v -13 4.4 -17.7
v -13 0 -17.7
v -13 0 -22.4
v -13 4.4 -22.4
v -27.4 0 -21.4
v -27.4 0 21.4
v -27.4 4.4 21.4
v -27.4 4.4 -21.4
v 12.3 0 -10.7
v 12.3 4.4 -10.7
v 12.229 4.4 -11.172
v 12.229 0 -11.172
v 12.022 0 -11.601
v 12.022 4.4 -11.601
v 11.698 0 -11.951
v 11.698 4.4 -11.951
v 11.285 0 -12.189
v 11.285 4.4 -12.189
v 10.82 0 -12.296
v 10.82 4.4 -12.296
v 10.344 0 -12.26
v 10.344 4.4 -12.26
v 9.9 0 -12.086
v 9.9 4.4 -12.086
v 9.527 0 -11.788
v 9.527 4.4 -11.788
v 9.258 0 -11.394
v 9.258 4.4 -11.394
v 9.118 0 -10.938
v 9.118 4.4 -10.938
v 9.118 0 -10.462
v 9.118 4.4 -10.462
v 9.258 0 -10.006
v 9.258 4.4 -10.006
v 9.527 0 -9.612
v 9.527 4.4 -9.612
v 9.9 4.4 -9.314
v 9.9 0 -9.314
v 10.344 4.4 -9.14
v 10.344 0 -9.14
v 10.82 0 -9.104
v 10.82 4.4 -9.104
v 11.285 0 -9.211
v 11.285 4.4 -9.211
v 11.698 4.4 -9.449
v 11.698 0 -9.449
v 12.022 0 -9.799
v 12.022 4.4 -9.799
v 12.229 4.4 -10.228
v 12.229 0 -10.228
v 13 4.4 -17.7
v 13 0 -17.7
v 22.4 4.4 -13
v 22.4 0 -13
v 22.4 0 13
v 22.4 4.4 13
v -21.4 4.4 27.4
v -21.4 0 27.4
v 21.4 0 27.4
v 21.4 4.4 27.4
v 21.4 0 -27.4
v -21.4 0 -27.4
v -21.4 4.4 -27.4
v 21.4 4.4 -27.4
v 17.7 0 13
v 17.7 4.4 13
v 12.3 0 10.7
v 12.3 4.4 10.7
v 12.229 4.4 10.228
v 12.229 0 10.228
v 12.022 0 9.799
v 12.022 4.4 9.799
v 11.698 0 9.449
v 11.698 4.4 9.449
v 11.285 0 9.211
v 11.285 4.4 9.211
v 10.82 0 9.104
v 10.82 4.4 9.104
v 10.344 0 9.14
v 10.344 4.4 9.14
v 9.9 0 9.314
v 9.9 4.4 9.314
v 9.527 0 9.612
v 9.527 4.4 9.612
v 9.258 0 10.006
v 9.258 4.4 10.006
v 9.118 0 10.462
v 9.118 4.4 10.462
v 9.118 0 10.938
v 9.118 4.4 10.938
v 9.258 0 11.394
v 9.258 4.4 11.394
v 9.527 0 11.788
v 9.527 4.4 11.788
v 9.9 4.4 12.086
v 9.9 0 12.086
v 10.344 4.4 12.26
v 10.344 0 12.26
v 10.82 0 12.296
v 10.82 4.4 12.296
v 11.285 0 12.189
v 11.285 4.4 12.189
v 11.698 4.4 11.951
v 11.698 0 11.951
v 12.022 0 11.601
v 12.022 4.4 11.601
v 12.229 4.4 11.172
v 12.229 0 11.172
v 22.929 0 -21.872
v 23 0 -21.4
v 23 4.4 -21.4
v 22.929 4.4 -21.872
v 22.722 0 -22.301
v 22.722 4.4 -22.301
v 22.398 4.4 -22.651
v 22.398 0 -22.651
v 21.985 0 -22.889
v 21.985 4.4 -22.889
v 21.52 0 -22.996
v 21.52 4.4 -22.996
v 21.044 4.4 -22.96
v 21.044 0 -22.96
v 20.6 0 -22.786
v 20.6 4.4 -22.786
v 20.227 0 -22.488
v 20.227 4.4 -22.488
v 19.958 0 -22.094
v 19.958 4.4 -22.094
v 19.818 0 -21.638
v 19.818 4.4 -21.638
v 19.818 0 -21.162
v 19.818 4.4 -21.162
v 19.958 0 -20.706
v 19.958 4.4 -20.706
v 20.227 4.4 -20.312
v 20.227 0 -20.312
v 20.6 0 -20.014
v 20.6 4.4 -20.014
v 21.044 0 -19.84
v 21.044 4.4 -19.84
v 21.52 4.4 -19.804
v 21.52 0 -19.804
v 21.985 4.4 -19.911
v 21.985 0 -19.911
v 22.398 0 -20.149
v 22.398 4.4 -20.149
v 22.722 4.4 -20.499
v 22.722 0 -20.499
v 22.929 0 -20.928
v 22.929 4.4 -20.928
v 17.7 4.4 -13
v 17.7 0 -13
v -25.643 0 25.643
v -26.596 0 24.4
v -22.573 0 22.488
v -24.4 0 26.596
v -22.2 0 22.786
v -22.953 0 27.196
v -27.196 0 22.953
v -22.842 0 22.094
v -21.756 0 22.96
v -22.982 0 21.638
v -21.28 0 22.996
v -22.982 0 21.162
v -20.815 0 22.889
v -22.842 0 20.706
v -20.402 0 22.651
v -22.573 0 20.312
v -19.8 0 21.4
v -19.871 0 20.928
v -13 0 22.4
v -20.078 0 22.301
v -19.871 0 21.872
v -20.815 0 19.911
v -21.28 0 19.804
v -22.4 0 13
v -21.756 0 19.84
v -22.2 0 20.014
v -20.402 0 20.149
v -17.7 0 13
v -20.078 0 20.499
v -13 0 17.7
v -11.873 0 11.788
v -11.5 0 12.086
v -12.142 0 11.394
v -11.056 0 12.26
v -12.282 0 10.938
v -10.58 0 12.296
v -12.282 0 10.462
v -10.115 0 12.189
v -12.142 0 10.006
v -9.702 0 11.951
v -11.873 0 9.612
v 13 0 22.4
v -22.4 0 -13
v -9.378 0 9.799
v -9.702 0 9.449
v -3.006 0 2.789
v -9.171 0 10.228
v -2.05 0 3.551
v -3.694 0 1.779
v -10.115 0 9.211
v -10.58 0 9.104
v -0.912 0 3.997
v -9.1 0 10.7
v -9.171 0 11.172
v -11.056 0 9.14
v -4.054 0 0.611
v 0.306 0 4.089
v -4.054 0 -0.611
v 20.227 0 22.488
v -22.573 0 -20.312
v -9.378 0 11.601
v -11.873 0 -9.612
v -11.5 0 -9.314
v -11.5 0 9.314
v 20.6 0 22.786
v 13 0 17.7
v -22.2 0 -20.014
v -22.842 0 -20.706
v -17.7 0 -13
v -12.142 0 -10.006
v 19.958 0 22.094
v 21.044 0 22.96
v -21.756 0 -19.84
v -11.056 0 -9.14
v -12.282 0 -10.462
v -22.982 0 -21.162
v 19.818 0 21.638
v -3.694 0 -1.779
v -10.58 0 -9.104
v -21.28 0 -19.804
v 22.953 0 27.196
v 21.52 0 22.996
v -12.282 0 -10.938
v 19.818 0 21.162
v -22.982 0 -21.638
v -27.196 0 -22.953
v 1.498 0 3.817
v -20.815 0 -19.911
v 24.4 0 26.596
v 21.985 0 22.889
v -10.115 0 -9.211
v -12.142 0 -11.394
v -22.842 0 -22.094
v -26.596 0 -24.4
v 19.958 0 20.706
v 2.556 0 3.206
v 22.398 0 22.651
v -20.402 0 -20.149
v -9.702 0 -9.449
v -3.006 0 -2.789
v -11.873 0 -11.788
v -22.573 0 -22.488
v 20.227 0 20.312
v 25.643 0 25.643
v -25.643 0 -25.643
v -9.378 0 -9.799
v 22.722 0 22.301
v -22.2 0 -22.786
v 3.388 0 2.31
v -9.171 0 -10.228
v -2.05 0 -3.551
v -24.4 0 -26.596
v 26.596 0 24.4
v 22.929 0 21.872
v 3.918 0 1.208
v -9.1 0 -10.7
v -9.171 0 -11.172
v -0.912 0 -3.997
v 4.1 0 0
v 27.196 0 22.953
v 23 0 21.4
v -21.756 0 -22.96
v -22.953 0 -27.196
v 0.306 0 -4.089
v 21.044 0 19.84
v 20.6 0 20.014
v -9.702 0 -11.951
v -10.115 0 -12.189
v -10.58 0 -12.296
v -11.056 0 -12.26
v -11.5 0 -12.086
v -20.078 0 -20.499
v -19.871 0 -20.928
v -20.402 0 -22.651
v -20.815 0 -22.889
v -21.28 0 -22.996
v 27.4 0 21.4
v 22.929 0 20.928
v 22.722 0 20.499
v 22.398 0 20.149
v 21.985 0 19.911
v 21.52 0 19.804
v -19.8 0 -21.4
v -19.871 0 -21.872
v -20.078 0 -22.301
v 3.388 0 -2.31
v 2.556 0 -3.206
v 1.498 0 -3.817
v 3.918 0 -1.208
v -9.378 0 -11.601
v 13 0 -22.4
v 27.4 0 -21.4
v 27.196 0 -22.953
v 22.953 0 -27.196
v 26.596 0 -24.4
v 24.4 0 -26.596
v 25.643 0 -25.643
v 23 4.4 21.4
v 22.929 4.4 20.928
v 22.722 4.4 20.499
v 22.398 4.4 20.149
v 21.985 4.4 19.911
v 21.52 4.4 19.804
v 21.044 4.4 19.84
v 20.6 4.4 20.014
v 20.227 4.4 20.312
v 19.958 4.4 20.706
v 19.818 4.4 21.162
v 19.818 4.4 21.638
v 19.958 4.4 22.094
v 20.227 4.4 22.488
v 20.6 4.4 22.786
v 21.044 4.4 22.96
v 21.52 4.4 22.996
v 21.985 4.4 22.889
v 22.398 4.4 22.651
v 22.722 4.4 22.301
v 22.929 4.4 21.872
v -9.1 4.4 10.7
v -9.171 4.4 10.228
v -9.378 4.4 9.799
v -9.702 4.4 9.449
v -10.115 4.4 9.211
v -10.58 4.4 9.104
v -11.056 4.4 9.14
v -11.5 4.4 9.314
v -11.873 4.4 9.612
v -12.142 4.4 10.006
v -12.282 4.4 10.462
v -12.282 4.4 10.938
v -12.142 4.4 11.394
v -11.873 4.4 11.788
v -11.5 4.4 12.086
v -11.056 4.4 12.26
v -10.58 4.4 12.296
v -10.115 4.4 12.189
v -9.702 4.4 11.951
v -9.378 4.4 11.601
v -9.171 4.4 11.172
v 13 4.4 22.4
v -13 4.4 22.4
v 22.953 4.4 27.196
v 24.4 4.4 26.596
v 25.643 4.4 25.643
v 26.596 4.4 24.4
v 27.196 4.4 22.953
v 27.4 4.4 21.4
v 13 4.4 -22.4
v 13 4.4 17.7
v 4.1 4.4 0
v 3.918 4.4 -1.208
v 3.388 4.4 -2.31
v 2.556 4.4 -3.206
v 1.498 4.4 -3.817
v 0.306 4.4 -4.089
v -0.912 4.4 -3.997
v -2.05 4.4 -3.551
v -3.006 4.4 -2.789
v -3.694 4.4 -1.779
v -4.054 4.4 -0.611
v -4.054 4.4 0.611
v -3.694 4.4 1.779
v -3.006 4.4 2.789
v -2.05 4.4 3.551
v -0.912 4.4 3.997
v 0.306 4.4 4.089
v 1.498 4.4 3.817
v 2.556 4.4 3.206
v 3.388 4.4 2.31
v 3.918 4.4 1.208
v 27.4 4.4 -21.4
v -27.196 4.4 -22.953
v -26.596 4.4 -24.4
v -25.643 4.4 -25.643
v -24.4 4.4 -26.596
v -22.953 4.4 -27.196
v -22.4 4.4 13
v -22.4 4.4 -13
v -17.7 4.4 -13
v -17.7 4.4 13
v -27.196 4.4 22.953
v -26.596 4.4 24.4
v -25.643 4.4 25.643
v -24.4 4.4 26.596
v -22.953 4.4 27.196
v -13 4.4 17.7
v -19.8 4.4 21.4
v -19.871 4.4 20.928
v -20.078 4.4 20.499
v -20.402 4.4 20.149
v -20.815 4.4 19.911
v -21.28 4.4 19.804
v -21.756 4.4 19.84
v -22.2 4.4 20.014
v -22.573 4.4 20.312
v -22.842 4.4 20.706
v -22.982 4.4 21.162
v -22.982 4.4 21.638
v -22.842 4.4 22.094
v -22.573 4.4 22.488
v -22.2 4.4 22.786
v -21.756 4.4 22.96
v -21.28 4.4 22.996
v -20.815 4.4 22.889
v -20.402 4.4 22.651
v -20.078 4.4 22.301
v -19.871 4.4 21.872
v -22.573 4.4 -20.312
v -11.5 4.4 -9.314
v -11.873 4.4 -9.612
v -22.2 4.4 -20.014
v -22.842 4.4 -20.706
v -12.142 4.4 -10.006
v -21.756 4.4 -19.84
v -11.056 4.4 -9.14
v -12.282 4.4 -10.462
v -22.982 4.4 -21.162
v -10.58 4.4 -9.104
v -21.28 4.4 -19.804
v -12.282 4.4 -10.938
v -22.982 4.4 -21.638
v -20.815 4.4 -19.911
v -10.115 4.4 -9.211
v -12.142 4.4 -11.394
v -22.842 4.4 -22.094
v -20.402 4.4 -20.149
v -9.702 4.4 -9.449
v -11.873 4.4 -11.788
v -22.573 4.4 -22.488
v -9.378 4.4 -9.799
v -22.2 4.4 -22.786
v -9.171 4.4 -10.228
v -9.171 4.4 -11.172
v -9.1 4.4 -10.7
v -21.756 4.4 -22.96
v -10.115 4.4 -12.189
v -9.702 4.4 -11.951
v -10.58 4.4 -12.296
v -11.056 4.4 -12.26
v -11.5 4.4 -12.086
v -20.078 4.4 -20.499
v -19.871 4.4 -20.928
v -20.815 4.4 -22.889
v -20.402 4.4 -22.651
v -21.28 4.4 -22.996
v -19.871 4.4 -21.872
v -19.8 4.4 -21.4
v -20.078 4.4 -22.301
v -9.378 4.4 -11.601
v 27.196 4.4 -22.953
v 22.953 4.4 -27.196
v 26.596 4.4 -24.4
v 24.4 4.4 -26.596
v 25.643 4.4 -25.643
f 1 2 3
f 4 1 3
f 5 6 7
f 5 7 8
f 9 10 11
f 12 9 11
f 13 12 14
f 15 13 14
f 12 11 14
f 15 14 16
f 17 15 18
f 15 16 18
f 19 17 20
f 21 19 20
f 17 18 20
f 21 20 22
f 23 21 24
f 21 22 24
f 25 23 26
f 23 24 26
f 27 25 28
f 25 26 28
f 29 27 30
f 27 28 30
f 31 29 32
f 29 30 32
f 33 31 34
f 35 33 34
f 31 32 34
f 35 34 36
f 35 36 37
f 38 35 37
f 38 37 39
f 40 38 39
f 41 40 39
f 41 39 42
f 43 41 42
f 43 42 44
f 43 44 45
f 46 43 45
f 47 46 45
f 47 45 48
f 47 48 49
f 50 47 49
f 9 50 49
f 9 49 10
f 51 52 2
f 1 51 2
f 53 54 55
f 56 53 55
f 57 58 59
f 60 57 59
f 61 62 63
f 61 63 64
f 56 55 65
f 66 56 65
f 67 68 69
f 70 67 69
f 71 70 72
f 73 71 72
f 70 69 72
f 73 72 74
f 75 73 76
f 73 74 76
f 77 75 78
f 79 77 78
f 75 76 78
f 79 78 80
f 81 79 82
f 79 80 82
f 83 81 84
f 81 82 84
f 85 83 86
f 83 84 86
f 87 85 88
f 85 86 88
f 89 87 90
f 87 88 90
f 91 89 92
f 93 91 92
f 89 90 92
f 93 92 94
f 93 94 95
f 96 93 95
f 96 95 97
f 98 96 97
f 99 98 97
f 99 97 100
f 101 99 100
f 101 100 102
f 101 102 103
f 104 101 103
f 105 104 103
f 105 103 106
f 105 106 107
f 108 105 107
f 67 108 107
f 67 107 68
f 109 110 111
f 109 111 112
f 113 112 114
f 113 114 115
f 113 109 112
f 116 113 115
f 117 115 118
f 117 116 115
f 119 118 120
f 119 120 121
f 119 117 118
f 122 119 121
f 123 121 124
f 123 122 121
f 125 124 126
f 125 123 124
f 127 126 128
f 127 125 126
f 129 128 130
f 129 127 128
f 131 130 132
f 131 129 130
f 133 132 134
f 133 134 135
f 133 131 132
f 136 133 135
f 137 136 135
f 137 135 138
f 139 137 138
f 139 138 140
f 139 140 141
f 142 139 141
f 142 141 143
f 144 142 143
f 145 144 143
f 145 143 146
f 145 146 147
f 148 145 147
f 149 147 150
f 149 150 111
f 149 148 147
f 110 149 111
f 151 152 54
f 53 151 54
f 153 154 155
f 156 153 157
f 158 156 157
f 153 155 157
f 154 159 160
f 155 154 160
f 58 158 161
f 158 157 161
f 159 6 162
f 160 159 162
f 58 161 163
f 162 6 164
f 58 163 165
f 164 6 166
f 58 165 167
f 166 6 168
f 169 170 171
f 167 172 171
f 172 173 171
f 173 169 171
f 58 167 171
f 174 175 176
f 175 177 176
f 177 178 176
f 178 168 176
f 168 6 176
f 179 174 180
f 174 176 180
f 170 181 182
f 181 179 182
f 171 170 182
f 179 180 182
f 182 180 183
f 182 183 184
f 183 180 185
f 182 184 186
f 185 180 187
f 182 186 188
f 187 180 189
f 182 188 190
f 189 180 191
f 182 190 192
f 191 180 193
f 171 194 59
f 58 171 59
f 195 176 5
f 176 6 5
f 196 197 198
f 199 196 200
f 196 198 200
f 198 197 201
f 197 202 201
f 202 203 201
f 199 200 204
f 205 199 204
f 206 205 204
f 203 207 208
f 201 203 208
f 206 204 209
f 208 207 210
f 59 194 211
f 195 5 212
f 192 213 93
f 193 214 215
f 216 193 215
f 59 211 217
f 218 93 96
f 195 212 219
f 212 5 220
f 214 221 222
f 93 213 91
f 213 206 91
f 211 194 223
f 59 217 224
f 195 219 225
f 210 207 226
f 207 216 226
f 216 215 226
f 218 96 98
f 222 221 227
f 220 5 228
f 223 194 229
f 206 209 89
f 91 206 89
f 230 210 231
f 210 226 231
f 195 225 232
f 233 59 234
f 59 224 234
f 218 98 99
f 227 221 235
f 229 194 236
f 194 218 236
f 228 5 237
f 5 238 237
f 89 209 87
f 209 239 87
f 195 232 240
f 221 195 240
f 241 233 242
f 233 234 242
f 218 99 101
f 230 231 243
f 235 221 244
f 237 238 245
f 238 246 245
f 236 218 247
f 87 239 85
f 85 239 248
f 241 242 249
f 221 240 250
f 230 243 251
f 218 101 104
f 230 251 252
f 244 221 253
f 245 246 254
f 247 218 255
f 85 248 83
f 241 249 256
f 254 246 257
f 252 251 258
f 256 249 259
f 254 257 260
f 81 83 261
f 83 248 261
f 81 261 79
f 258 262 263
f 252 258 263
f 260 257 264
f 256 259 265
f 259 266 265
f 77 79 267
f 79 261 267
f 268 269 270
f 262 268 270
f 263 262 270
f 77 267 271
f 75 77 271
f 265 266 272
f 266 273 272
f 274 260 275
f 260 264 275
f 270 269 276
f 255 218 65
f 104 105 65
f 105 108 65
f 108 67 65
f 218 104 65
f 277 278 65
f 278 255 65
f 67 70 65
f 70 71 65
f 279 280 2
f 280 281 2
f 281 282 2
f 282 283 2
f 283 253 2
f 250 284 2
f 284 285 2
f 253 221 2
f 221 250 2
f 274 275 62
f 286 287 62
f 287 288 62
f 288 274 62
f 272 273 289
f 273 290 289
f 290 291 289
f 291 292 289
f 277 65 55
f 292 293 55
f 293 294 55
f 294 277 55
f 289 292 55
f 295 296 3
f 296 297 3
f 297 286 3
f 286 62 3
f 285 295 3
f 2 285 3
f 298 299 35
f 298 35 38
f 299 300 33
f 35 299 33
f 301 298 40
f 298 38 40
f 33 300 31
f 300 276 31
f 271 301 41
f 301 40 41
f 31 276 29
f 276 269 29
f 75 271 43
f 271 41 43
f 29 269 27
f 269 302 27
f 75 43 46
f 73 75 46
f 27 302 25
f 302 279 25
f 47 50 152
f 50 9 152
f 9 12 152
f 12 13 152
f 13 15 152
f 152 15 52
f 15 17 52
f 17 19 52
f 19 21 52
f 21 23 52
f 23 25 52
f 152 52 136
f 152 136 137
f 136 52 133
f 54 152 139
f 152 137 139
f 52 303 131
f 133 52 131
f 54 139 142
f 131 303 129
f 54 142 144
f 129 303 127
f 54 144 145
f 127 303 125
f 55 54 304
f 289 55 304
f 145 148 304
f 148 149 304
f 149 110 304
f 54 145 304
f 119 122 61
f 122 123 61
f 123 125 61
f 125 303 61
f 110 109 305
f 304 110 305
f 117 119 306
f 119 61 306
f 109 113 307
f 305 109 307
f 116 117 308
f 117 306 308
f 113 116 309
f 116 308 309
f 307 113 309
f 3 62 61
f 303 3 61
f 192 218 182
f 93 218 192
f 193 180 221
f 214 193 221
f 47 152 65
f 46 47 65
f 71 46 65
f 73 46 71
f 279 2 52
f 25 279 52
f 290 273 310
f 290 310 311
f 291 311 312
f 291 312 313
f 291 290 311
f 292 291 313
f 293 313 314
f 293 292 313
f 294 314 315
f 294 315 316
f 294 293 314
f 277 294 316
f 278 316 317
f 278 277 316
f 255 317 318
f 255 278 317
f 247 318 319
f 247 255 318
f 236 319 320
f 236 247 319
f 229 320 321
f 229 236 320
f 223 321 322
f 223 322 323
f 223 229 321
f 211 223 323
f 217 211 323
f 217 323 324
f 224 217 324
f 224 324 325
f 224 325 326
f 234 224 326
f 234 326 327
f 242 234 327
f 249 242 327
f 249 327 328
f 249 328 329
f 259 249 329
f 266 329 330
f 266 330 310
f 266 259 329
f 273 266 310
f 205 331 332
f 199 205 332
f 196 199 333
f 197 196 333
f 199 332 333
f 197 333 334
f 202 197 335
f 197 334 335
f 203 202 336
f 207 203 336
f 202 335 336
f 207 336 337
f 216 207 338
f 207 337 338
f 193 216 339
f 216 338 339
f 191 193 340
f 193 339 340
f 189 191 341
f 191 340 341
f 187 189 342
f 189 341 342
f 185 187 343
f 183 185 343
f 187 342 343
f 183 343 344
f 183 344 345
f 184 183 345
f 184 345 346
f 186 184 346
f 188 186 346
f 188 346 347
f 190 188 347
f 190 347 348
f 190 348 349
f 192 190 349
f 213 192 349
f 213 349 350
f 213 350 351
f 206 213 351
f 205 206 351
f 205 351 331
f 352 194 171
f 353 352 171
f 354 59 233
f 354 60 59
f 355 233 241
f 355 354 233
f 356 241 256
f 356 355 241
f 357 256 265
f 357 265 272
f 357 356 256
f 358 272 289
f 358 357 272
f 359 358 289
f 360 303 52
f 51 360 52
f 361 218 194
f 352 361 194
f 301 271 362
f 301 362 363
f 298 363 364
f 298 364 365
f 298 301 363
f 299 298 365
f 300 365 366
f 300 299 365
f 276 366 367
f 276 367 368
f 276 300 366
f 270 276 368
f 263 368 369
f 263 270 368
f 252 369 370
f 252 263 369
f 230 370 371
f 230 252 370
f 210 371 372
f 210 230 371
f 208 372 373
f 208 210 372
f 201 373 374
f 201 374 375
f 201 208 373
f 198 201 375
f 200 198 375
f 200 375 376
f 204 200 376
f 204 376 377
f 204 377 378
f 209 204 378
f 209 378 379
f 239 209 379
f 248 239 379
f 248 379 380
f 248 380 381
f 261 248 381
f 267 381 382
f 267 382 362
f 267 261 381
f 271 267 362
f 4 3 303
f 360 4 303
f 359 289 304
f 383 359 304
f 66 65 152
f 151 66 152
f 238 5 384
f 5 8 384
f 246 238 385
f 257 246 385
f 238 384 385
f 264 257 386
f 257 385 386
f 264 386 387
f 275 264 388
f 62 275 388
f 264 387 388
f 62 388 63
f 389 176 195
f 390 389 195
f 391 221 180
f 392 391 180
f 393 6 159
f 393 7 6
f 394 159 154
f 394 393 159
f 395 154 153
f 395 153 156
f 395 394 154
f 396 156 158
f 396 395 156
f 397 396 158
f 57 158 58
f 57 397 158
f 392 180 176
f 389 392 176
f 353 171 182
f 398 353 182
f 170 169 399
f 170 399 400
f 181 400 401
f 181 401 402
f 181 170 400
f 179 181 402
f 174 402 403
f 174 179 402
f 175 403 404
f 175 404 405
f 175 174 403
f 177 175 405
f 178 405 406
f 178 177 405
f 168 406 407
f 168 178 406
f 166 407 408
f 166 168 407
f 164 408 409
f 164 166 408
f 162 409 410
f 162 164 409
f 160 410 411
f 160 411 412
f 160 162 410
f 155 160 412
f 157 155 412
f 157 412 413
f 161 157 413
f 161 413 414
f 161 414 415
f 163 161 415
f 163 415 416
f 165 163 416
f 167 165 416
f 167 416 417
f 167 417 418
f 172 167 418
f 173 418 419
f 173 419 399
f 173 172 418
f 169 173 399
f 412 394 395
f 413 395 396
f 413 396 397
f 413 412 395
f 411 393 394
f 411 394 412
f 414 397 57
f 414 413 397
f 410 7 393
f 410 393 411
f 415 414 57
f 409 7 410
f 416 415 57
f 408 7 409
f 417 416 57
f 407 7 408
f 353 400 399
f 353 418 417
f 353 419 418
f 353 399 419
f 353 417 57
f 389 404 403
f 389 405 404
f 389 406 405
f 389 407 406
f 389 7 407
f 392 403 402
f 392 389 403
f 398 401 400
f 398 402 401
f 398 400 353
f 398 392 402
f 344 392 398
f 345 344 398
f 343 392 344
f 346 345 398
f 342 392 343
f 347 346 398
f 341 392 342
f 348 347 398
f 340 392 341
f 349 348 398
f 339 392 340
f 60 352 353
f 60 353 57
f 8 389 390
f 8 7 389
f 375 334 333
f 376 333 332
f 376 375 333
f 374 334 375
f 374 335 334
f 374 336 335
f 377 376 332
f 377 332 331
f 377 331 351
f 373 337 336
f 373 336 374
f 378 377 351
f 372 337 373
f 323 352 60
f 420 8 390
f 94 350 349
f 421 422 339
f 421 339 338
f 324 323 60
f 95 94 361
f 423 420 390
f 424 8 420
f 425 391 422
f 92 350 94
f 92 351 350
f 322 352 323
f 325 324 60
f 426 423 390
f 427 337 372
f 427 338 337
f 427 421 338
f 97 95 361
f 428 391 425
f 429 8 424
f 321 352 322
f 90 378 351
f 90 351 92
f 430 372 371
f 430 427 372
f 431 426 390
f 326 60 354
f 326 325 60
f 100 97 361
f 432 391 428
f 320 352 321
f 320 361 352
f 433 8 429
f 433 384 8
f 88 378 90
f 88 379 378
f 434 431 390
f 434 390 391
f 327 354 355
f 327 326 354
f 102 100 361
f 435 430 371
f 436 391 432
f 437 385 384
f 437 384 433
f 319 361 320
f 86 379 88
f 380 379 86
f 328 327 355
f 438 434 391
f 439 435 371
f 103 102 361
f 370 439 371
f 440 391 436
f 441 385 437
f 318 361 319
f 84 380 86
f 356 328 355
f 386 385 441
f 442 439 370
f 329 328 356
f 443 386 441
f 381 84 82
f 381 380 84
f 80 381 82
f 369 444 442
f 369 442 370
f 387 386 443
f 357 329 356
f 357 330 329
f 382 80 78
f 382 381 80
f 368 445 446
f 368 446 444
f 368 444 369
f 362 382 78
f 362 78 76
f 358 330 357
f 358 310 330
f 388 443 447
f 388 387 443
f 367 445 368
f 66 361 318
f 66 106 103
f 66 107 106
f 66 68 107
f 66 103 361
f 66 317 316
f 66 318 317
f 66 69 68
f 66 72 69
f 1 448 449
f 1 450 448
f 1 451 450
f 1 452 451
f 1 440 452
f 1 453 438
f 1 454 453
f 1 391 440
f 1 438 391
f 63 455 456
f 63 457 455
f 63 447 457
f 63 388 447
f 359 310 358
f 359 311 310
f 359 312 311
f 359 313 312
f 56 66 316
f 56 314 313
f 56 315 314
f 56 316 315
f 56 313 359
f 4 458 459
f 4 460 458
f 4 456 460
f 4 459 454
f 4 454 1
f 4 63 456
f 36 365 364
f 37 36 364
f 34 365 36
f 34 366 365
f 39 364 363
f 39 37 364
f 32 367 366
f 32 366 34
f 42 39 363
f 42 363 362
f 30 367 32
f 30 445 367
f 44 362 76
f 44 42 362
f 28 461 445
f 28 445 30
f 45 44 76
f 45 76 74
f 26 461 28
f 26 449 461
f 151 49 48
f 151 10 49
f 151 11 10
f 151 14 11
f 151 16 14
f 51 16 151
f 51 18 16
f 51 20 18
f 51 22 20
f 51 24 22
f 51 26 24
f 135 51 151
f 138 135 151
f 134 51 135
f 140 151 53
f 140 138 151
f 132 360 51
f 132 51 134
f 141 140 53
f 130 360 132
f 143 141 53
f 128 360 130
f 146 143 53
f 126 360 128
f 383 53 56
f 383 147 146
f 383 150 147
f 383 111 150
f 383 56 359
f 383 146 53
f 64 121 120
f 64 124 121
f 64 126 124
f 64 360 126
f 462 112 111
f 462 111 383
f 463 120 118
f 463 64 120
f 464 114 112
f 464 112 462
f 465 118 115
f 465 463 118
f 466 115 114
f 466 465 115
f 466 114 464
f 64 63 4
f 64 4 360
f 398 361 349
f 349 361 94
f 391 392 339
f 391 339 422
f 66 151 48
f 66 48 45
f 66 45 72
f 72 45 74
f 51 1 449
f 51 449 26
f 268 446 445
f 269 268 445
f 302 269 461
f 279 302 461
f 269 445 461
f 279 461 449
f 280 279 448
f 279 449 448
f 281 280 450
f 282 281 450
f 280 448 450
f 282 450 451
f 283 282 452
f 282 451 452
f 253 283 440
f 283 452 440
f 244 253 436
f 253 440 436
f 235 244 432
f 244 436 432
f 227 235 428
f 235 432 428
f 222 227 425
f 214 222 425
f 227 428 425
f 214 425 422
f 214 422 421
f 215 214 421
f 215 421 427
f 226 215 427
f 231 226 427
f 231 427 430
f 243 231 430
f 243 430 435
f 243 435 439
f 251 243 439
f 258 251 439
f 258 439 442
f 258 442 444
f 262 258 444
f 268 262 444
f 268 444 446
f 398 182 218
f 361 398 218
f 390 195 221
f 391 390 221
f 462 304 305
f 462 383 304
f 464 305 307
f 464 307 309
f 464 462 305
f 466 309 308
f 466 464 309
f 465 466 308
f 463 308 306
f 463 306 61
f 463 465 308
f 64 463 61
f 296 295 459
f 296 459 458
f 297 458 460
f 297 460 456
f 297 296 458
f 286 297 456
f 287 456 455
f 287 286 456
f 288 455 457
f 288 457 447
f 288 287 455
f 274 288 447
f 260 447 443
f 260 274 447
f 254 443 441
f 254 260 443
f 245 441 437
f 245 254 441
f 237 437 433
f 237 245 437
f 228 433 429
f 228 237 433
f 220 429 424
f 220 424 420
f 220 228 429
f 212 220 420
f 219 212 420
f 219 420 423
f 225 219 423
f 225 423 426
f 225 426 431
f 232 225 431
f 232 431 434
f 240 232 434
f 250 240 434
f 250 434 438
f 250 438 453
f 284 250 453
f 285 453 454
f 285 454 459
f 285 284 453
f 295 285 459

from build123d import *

# Parameters (mm, degrees)
SKETCH_1_W          = 54.8
SKETCH_1_H          = 54.8
SKETCH_1_R          = 4.1
SKETCH_1_R_2        = 1.6
EXTRUDE_1_DEPTH     = 4.4
FILLET_1_R          = 6
SKETCH_2_R          = 1.6
CUT_EXTRUDE_1_DEPTH = 10


with BuildPart() as part:
    # 草图1 → 凸台-拉伸1 (new body)
    with BuildSketch(Plane(origin=(0, 0, 0), x_dir=(1, 0, 0), z_dir=(0, 1, 0))):
        Rectangle(SKETCH_1_W, SKETCH_1_H)
        Circle(SKETCH_1_R, mode=Mode.SUBTRACT)
        with Locations((21.4, 21.4)):
            Circle(SKETCH_1_R_2, mode=Mode.SUBTRACT)
        with Locations((21.4, -21.4)):
            Circle(SKETCH_1_R_2, mode=Mode.SUBTRACT)
        with Locations((-21.4, -21.4)):
            Circle(SKETCH_1_R_2, mode=Mode.SUBTRACT)
        with Locations((-21.4, 21.4)):
            Circle(SKETCH_1_R_2, mode=Mode.SUBTRACT)
        Polygon((17.7, -5), (17.7, 5), (17.7, 13), (22.4, 13), (22.4, 5), (22.4, -5), (22.4, -13), (17.7, -13), align=None, mode=Mode.SUBTRACT)
        Polygon((-5, 17.7), (-13, 17.7), (-13, 22.4), (-5, 22.4), (5, 22.4), (13, 22.4), (13, 17.7), (5, 17.7), align=None, mode=Mode.SUBTRACT)
        Polygon((5, -17.7), (13, -17.7), (13, -22.4), (5, -22.4), (-5, -22.4), (-13, -22.4), (-13, -17.7), (-5, -17.7), align=None, mode=Mode.SUBTRACT)
        Polygon((-17.7, 5), (-17.7, -5), (-17.7, -13), (-22.4, -13), (-22.4, -5), (-22.4, 5), (-22.4, 13), (-17.7, 13), align=None, mode=Mode.SUBTRACT)
    extrude(amount=EXTRUDE_1_DEPTH)

    # 圆角1
    fillet_1_edges = [part.edges().sort_by_distance(p)[0] for p in [
        (27.4, 2.2, 27.4),
        (-27.4, 2.2, 27.4),
        (-27.4, 2.2, -27.4),
        (27.4, 2.2, -27.4),
    ]]
    fillet(fillet_1_edges, radius=FILLET_1_R)

    # 草图2 → 切除-拉伸1 (cut)
    with BuildSketch(Plane(origin=(0, 4.4, 0), x_dir=(1, 0, 0), z_dir=(0, 1, 0))):
        with Locations((10.7, 10.7)):
            Circle(SKETCH_2_R)
        with Locations((10.7, -10.7)):
            Circle(SKETCH_2_R)
        with Locations((-10.7, -10.7)):
            Circle(SKETCH_2_R)
        with Locations((-10.7, 10.7)):
            Circle(SKETCH_2_R)
    extrude(amount=-CUT_EXTRUDE_1_DEPTH, mode=Mode.SUBTRACT)


solid = part.part
